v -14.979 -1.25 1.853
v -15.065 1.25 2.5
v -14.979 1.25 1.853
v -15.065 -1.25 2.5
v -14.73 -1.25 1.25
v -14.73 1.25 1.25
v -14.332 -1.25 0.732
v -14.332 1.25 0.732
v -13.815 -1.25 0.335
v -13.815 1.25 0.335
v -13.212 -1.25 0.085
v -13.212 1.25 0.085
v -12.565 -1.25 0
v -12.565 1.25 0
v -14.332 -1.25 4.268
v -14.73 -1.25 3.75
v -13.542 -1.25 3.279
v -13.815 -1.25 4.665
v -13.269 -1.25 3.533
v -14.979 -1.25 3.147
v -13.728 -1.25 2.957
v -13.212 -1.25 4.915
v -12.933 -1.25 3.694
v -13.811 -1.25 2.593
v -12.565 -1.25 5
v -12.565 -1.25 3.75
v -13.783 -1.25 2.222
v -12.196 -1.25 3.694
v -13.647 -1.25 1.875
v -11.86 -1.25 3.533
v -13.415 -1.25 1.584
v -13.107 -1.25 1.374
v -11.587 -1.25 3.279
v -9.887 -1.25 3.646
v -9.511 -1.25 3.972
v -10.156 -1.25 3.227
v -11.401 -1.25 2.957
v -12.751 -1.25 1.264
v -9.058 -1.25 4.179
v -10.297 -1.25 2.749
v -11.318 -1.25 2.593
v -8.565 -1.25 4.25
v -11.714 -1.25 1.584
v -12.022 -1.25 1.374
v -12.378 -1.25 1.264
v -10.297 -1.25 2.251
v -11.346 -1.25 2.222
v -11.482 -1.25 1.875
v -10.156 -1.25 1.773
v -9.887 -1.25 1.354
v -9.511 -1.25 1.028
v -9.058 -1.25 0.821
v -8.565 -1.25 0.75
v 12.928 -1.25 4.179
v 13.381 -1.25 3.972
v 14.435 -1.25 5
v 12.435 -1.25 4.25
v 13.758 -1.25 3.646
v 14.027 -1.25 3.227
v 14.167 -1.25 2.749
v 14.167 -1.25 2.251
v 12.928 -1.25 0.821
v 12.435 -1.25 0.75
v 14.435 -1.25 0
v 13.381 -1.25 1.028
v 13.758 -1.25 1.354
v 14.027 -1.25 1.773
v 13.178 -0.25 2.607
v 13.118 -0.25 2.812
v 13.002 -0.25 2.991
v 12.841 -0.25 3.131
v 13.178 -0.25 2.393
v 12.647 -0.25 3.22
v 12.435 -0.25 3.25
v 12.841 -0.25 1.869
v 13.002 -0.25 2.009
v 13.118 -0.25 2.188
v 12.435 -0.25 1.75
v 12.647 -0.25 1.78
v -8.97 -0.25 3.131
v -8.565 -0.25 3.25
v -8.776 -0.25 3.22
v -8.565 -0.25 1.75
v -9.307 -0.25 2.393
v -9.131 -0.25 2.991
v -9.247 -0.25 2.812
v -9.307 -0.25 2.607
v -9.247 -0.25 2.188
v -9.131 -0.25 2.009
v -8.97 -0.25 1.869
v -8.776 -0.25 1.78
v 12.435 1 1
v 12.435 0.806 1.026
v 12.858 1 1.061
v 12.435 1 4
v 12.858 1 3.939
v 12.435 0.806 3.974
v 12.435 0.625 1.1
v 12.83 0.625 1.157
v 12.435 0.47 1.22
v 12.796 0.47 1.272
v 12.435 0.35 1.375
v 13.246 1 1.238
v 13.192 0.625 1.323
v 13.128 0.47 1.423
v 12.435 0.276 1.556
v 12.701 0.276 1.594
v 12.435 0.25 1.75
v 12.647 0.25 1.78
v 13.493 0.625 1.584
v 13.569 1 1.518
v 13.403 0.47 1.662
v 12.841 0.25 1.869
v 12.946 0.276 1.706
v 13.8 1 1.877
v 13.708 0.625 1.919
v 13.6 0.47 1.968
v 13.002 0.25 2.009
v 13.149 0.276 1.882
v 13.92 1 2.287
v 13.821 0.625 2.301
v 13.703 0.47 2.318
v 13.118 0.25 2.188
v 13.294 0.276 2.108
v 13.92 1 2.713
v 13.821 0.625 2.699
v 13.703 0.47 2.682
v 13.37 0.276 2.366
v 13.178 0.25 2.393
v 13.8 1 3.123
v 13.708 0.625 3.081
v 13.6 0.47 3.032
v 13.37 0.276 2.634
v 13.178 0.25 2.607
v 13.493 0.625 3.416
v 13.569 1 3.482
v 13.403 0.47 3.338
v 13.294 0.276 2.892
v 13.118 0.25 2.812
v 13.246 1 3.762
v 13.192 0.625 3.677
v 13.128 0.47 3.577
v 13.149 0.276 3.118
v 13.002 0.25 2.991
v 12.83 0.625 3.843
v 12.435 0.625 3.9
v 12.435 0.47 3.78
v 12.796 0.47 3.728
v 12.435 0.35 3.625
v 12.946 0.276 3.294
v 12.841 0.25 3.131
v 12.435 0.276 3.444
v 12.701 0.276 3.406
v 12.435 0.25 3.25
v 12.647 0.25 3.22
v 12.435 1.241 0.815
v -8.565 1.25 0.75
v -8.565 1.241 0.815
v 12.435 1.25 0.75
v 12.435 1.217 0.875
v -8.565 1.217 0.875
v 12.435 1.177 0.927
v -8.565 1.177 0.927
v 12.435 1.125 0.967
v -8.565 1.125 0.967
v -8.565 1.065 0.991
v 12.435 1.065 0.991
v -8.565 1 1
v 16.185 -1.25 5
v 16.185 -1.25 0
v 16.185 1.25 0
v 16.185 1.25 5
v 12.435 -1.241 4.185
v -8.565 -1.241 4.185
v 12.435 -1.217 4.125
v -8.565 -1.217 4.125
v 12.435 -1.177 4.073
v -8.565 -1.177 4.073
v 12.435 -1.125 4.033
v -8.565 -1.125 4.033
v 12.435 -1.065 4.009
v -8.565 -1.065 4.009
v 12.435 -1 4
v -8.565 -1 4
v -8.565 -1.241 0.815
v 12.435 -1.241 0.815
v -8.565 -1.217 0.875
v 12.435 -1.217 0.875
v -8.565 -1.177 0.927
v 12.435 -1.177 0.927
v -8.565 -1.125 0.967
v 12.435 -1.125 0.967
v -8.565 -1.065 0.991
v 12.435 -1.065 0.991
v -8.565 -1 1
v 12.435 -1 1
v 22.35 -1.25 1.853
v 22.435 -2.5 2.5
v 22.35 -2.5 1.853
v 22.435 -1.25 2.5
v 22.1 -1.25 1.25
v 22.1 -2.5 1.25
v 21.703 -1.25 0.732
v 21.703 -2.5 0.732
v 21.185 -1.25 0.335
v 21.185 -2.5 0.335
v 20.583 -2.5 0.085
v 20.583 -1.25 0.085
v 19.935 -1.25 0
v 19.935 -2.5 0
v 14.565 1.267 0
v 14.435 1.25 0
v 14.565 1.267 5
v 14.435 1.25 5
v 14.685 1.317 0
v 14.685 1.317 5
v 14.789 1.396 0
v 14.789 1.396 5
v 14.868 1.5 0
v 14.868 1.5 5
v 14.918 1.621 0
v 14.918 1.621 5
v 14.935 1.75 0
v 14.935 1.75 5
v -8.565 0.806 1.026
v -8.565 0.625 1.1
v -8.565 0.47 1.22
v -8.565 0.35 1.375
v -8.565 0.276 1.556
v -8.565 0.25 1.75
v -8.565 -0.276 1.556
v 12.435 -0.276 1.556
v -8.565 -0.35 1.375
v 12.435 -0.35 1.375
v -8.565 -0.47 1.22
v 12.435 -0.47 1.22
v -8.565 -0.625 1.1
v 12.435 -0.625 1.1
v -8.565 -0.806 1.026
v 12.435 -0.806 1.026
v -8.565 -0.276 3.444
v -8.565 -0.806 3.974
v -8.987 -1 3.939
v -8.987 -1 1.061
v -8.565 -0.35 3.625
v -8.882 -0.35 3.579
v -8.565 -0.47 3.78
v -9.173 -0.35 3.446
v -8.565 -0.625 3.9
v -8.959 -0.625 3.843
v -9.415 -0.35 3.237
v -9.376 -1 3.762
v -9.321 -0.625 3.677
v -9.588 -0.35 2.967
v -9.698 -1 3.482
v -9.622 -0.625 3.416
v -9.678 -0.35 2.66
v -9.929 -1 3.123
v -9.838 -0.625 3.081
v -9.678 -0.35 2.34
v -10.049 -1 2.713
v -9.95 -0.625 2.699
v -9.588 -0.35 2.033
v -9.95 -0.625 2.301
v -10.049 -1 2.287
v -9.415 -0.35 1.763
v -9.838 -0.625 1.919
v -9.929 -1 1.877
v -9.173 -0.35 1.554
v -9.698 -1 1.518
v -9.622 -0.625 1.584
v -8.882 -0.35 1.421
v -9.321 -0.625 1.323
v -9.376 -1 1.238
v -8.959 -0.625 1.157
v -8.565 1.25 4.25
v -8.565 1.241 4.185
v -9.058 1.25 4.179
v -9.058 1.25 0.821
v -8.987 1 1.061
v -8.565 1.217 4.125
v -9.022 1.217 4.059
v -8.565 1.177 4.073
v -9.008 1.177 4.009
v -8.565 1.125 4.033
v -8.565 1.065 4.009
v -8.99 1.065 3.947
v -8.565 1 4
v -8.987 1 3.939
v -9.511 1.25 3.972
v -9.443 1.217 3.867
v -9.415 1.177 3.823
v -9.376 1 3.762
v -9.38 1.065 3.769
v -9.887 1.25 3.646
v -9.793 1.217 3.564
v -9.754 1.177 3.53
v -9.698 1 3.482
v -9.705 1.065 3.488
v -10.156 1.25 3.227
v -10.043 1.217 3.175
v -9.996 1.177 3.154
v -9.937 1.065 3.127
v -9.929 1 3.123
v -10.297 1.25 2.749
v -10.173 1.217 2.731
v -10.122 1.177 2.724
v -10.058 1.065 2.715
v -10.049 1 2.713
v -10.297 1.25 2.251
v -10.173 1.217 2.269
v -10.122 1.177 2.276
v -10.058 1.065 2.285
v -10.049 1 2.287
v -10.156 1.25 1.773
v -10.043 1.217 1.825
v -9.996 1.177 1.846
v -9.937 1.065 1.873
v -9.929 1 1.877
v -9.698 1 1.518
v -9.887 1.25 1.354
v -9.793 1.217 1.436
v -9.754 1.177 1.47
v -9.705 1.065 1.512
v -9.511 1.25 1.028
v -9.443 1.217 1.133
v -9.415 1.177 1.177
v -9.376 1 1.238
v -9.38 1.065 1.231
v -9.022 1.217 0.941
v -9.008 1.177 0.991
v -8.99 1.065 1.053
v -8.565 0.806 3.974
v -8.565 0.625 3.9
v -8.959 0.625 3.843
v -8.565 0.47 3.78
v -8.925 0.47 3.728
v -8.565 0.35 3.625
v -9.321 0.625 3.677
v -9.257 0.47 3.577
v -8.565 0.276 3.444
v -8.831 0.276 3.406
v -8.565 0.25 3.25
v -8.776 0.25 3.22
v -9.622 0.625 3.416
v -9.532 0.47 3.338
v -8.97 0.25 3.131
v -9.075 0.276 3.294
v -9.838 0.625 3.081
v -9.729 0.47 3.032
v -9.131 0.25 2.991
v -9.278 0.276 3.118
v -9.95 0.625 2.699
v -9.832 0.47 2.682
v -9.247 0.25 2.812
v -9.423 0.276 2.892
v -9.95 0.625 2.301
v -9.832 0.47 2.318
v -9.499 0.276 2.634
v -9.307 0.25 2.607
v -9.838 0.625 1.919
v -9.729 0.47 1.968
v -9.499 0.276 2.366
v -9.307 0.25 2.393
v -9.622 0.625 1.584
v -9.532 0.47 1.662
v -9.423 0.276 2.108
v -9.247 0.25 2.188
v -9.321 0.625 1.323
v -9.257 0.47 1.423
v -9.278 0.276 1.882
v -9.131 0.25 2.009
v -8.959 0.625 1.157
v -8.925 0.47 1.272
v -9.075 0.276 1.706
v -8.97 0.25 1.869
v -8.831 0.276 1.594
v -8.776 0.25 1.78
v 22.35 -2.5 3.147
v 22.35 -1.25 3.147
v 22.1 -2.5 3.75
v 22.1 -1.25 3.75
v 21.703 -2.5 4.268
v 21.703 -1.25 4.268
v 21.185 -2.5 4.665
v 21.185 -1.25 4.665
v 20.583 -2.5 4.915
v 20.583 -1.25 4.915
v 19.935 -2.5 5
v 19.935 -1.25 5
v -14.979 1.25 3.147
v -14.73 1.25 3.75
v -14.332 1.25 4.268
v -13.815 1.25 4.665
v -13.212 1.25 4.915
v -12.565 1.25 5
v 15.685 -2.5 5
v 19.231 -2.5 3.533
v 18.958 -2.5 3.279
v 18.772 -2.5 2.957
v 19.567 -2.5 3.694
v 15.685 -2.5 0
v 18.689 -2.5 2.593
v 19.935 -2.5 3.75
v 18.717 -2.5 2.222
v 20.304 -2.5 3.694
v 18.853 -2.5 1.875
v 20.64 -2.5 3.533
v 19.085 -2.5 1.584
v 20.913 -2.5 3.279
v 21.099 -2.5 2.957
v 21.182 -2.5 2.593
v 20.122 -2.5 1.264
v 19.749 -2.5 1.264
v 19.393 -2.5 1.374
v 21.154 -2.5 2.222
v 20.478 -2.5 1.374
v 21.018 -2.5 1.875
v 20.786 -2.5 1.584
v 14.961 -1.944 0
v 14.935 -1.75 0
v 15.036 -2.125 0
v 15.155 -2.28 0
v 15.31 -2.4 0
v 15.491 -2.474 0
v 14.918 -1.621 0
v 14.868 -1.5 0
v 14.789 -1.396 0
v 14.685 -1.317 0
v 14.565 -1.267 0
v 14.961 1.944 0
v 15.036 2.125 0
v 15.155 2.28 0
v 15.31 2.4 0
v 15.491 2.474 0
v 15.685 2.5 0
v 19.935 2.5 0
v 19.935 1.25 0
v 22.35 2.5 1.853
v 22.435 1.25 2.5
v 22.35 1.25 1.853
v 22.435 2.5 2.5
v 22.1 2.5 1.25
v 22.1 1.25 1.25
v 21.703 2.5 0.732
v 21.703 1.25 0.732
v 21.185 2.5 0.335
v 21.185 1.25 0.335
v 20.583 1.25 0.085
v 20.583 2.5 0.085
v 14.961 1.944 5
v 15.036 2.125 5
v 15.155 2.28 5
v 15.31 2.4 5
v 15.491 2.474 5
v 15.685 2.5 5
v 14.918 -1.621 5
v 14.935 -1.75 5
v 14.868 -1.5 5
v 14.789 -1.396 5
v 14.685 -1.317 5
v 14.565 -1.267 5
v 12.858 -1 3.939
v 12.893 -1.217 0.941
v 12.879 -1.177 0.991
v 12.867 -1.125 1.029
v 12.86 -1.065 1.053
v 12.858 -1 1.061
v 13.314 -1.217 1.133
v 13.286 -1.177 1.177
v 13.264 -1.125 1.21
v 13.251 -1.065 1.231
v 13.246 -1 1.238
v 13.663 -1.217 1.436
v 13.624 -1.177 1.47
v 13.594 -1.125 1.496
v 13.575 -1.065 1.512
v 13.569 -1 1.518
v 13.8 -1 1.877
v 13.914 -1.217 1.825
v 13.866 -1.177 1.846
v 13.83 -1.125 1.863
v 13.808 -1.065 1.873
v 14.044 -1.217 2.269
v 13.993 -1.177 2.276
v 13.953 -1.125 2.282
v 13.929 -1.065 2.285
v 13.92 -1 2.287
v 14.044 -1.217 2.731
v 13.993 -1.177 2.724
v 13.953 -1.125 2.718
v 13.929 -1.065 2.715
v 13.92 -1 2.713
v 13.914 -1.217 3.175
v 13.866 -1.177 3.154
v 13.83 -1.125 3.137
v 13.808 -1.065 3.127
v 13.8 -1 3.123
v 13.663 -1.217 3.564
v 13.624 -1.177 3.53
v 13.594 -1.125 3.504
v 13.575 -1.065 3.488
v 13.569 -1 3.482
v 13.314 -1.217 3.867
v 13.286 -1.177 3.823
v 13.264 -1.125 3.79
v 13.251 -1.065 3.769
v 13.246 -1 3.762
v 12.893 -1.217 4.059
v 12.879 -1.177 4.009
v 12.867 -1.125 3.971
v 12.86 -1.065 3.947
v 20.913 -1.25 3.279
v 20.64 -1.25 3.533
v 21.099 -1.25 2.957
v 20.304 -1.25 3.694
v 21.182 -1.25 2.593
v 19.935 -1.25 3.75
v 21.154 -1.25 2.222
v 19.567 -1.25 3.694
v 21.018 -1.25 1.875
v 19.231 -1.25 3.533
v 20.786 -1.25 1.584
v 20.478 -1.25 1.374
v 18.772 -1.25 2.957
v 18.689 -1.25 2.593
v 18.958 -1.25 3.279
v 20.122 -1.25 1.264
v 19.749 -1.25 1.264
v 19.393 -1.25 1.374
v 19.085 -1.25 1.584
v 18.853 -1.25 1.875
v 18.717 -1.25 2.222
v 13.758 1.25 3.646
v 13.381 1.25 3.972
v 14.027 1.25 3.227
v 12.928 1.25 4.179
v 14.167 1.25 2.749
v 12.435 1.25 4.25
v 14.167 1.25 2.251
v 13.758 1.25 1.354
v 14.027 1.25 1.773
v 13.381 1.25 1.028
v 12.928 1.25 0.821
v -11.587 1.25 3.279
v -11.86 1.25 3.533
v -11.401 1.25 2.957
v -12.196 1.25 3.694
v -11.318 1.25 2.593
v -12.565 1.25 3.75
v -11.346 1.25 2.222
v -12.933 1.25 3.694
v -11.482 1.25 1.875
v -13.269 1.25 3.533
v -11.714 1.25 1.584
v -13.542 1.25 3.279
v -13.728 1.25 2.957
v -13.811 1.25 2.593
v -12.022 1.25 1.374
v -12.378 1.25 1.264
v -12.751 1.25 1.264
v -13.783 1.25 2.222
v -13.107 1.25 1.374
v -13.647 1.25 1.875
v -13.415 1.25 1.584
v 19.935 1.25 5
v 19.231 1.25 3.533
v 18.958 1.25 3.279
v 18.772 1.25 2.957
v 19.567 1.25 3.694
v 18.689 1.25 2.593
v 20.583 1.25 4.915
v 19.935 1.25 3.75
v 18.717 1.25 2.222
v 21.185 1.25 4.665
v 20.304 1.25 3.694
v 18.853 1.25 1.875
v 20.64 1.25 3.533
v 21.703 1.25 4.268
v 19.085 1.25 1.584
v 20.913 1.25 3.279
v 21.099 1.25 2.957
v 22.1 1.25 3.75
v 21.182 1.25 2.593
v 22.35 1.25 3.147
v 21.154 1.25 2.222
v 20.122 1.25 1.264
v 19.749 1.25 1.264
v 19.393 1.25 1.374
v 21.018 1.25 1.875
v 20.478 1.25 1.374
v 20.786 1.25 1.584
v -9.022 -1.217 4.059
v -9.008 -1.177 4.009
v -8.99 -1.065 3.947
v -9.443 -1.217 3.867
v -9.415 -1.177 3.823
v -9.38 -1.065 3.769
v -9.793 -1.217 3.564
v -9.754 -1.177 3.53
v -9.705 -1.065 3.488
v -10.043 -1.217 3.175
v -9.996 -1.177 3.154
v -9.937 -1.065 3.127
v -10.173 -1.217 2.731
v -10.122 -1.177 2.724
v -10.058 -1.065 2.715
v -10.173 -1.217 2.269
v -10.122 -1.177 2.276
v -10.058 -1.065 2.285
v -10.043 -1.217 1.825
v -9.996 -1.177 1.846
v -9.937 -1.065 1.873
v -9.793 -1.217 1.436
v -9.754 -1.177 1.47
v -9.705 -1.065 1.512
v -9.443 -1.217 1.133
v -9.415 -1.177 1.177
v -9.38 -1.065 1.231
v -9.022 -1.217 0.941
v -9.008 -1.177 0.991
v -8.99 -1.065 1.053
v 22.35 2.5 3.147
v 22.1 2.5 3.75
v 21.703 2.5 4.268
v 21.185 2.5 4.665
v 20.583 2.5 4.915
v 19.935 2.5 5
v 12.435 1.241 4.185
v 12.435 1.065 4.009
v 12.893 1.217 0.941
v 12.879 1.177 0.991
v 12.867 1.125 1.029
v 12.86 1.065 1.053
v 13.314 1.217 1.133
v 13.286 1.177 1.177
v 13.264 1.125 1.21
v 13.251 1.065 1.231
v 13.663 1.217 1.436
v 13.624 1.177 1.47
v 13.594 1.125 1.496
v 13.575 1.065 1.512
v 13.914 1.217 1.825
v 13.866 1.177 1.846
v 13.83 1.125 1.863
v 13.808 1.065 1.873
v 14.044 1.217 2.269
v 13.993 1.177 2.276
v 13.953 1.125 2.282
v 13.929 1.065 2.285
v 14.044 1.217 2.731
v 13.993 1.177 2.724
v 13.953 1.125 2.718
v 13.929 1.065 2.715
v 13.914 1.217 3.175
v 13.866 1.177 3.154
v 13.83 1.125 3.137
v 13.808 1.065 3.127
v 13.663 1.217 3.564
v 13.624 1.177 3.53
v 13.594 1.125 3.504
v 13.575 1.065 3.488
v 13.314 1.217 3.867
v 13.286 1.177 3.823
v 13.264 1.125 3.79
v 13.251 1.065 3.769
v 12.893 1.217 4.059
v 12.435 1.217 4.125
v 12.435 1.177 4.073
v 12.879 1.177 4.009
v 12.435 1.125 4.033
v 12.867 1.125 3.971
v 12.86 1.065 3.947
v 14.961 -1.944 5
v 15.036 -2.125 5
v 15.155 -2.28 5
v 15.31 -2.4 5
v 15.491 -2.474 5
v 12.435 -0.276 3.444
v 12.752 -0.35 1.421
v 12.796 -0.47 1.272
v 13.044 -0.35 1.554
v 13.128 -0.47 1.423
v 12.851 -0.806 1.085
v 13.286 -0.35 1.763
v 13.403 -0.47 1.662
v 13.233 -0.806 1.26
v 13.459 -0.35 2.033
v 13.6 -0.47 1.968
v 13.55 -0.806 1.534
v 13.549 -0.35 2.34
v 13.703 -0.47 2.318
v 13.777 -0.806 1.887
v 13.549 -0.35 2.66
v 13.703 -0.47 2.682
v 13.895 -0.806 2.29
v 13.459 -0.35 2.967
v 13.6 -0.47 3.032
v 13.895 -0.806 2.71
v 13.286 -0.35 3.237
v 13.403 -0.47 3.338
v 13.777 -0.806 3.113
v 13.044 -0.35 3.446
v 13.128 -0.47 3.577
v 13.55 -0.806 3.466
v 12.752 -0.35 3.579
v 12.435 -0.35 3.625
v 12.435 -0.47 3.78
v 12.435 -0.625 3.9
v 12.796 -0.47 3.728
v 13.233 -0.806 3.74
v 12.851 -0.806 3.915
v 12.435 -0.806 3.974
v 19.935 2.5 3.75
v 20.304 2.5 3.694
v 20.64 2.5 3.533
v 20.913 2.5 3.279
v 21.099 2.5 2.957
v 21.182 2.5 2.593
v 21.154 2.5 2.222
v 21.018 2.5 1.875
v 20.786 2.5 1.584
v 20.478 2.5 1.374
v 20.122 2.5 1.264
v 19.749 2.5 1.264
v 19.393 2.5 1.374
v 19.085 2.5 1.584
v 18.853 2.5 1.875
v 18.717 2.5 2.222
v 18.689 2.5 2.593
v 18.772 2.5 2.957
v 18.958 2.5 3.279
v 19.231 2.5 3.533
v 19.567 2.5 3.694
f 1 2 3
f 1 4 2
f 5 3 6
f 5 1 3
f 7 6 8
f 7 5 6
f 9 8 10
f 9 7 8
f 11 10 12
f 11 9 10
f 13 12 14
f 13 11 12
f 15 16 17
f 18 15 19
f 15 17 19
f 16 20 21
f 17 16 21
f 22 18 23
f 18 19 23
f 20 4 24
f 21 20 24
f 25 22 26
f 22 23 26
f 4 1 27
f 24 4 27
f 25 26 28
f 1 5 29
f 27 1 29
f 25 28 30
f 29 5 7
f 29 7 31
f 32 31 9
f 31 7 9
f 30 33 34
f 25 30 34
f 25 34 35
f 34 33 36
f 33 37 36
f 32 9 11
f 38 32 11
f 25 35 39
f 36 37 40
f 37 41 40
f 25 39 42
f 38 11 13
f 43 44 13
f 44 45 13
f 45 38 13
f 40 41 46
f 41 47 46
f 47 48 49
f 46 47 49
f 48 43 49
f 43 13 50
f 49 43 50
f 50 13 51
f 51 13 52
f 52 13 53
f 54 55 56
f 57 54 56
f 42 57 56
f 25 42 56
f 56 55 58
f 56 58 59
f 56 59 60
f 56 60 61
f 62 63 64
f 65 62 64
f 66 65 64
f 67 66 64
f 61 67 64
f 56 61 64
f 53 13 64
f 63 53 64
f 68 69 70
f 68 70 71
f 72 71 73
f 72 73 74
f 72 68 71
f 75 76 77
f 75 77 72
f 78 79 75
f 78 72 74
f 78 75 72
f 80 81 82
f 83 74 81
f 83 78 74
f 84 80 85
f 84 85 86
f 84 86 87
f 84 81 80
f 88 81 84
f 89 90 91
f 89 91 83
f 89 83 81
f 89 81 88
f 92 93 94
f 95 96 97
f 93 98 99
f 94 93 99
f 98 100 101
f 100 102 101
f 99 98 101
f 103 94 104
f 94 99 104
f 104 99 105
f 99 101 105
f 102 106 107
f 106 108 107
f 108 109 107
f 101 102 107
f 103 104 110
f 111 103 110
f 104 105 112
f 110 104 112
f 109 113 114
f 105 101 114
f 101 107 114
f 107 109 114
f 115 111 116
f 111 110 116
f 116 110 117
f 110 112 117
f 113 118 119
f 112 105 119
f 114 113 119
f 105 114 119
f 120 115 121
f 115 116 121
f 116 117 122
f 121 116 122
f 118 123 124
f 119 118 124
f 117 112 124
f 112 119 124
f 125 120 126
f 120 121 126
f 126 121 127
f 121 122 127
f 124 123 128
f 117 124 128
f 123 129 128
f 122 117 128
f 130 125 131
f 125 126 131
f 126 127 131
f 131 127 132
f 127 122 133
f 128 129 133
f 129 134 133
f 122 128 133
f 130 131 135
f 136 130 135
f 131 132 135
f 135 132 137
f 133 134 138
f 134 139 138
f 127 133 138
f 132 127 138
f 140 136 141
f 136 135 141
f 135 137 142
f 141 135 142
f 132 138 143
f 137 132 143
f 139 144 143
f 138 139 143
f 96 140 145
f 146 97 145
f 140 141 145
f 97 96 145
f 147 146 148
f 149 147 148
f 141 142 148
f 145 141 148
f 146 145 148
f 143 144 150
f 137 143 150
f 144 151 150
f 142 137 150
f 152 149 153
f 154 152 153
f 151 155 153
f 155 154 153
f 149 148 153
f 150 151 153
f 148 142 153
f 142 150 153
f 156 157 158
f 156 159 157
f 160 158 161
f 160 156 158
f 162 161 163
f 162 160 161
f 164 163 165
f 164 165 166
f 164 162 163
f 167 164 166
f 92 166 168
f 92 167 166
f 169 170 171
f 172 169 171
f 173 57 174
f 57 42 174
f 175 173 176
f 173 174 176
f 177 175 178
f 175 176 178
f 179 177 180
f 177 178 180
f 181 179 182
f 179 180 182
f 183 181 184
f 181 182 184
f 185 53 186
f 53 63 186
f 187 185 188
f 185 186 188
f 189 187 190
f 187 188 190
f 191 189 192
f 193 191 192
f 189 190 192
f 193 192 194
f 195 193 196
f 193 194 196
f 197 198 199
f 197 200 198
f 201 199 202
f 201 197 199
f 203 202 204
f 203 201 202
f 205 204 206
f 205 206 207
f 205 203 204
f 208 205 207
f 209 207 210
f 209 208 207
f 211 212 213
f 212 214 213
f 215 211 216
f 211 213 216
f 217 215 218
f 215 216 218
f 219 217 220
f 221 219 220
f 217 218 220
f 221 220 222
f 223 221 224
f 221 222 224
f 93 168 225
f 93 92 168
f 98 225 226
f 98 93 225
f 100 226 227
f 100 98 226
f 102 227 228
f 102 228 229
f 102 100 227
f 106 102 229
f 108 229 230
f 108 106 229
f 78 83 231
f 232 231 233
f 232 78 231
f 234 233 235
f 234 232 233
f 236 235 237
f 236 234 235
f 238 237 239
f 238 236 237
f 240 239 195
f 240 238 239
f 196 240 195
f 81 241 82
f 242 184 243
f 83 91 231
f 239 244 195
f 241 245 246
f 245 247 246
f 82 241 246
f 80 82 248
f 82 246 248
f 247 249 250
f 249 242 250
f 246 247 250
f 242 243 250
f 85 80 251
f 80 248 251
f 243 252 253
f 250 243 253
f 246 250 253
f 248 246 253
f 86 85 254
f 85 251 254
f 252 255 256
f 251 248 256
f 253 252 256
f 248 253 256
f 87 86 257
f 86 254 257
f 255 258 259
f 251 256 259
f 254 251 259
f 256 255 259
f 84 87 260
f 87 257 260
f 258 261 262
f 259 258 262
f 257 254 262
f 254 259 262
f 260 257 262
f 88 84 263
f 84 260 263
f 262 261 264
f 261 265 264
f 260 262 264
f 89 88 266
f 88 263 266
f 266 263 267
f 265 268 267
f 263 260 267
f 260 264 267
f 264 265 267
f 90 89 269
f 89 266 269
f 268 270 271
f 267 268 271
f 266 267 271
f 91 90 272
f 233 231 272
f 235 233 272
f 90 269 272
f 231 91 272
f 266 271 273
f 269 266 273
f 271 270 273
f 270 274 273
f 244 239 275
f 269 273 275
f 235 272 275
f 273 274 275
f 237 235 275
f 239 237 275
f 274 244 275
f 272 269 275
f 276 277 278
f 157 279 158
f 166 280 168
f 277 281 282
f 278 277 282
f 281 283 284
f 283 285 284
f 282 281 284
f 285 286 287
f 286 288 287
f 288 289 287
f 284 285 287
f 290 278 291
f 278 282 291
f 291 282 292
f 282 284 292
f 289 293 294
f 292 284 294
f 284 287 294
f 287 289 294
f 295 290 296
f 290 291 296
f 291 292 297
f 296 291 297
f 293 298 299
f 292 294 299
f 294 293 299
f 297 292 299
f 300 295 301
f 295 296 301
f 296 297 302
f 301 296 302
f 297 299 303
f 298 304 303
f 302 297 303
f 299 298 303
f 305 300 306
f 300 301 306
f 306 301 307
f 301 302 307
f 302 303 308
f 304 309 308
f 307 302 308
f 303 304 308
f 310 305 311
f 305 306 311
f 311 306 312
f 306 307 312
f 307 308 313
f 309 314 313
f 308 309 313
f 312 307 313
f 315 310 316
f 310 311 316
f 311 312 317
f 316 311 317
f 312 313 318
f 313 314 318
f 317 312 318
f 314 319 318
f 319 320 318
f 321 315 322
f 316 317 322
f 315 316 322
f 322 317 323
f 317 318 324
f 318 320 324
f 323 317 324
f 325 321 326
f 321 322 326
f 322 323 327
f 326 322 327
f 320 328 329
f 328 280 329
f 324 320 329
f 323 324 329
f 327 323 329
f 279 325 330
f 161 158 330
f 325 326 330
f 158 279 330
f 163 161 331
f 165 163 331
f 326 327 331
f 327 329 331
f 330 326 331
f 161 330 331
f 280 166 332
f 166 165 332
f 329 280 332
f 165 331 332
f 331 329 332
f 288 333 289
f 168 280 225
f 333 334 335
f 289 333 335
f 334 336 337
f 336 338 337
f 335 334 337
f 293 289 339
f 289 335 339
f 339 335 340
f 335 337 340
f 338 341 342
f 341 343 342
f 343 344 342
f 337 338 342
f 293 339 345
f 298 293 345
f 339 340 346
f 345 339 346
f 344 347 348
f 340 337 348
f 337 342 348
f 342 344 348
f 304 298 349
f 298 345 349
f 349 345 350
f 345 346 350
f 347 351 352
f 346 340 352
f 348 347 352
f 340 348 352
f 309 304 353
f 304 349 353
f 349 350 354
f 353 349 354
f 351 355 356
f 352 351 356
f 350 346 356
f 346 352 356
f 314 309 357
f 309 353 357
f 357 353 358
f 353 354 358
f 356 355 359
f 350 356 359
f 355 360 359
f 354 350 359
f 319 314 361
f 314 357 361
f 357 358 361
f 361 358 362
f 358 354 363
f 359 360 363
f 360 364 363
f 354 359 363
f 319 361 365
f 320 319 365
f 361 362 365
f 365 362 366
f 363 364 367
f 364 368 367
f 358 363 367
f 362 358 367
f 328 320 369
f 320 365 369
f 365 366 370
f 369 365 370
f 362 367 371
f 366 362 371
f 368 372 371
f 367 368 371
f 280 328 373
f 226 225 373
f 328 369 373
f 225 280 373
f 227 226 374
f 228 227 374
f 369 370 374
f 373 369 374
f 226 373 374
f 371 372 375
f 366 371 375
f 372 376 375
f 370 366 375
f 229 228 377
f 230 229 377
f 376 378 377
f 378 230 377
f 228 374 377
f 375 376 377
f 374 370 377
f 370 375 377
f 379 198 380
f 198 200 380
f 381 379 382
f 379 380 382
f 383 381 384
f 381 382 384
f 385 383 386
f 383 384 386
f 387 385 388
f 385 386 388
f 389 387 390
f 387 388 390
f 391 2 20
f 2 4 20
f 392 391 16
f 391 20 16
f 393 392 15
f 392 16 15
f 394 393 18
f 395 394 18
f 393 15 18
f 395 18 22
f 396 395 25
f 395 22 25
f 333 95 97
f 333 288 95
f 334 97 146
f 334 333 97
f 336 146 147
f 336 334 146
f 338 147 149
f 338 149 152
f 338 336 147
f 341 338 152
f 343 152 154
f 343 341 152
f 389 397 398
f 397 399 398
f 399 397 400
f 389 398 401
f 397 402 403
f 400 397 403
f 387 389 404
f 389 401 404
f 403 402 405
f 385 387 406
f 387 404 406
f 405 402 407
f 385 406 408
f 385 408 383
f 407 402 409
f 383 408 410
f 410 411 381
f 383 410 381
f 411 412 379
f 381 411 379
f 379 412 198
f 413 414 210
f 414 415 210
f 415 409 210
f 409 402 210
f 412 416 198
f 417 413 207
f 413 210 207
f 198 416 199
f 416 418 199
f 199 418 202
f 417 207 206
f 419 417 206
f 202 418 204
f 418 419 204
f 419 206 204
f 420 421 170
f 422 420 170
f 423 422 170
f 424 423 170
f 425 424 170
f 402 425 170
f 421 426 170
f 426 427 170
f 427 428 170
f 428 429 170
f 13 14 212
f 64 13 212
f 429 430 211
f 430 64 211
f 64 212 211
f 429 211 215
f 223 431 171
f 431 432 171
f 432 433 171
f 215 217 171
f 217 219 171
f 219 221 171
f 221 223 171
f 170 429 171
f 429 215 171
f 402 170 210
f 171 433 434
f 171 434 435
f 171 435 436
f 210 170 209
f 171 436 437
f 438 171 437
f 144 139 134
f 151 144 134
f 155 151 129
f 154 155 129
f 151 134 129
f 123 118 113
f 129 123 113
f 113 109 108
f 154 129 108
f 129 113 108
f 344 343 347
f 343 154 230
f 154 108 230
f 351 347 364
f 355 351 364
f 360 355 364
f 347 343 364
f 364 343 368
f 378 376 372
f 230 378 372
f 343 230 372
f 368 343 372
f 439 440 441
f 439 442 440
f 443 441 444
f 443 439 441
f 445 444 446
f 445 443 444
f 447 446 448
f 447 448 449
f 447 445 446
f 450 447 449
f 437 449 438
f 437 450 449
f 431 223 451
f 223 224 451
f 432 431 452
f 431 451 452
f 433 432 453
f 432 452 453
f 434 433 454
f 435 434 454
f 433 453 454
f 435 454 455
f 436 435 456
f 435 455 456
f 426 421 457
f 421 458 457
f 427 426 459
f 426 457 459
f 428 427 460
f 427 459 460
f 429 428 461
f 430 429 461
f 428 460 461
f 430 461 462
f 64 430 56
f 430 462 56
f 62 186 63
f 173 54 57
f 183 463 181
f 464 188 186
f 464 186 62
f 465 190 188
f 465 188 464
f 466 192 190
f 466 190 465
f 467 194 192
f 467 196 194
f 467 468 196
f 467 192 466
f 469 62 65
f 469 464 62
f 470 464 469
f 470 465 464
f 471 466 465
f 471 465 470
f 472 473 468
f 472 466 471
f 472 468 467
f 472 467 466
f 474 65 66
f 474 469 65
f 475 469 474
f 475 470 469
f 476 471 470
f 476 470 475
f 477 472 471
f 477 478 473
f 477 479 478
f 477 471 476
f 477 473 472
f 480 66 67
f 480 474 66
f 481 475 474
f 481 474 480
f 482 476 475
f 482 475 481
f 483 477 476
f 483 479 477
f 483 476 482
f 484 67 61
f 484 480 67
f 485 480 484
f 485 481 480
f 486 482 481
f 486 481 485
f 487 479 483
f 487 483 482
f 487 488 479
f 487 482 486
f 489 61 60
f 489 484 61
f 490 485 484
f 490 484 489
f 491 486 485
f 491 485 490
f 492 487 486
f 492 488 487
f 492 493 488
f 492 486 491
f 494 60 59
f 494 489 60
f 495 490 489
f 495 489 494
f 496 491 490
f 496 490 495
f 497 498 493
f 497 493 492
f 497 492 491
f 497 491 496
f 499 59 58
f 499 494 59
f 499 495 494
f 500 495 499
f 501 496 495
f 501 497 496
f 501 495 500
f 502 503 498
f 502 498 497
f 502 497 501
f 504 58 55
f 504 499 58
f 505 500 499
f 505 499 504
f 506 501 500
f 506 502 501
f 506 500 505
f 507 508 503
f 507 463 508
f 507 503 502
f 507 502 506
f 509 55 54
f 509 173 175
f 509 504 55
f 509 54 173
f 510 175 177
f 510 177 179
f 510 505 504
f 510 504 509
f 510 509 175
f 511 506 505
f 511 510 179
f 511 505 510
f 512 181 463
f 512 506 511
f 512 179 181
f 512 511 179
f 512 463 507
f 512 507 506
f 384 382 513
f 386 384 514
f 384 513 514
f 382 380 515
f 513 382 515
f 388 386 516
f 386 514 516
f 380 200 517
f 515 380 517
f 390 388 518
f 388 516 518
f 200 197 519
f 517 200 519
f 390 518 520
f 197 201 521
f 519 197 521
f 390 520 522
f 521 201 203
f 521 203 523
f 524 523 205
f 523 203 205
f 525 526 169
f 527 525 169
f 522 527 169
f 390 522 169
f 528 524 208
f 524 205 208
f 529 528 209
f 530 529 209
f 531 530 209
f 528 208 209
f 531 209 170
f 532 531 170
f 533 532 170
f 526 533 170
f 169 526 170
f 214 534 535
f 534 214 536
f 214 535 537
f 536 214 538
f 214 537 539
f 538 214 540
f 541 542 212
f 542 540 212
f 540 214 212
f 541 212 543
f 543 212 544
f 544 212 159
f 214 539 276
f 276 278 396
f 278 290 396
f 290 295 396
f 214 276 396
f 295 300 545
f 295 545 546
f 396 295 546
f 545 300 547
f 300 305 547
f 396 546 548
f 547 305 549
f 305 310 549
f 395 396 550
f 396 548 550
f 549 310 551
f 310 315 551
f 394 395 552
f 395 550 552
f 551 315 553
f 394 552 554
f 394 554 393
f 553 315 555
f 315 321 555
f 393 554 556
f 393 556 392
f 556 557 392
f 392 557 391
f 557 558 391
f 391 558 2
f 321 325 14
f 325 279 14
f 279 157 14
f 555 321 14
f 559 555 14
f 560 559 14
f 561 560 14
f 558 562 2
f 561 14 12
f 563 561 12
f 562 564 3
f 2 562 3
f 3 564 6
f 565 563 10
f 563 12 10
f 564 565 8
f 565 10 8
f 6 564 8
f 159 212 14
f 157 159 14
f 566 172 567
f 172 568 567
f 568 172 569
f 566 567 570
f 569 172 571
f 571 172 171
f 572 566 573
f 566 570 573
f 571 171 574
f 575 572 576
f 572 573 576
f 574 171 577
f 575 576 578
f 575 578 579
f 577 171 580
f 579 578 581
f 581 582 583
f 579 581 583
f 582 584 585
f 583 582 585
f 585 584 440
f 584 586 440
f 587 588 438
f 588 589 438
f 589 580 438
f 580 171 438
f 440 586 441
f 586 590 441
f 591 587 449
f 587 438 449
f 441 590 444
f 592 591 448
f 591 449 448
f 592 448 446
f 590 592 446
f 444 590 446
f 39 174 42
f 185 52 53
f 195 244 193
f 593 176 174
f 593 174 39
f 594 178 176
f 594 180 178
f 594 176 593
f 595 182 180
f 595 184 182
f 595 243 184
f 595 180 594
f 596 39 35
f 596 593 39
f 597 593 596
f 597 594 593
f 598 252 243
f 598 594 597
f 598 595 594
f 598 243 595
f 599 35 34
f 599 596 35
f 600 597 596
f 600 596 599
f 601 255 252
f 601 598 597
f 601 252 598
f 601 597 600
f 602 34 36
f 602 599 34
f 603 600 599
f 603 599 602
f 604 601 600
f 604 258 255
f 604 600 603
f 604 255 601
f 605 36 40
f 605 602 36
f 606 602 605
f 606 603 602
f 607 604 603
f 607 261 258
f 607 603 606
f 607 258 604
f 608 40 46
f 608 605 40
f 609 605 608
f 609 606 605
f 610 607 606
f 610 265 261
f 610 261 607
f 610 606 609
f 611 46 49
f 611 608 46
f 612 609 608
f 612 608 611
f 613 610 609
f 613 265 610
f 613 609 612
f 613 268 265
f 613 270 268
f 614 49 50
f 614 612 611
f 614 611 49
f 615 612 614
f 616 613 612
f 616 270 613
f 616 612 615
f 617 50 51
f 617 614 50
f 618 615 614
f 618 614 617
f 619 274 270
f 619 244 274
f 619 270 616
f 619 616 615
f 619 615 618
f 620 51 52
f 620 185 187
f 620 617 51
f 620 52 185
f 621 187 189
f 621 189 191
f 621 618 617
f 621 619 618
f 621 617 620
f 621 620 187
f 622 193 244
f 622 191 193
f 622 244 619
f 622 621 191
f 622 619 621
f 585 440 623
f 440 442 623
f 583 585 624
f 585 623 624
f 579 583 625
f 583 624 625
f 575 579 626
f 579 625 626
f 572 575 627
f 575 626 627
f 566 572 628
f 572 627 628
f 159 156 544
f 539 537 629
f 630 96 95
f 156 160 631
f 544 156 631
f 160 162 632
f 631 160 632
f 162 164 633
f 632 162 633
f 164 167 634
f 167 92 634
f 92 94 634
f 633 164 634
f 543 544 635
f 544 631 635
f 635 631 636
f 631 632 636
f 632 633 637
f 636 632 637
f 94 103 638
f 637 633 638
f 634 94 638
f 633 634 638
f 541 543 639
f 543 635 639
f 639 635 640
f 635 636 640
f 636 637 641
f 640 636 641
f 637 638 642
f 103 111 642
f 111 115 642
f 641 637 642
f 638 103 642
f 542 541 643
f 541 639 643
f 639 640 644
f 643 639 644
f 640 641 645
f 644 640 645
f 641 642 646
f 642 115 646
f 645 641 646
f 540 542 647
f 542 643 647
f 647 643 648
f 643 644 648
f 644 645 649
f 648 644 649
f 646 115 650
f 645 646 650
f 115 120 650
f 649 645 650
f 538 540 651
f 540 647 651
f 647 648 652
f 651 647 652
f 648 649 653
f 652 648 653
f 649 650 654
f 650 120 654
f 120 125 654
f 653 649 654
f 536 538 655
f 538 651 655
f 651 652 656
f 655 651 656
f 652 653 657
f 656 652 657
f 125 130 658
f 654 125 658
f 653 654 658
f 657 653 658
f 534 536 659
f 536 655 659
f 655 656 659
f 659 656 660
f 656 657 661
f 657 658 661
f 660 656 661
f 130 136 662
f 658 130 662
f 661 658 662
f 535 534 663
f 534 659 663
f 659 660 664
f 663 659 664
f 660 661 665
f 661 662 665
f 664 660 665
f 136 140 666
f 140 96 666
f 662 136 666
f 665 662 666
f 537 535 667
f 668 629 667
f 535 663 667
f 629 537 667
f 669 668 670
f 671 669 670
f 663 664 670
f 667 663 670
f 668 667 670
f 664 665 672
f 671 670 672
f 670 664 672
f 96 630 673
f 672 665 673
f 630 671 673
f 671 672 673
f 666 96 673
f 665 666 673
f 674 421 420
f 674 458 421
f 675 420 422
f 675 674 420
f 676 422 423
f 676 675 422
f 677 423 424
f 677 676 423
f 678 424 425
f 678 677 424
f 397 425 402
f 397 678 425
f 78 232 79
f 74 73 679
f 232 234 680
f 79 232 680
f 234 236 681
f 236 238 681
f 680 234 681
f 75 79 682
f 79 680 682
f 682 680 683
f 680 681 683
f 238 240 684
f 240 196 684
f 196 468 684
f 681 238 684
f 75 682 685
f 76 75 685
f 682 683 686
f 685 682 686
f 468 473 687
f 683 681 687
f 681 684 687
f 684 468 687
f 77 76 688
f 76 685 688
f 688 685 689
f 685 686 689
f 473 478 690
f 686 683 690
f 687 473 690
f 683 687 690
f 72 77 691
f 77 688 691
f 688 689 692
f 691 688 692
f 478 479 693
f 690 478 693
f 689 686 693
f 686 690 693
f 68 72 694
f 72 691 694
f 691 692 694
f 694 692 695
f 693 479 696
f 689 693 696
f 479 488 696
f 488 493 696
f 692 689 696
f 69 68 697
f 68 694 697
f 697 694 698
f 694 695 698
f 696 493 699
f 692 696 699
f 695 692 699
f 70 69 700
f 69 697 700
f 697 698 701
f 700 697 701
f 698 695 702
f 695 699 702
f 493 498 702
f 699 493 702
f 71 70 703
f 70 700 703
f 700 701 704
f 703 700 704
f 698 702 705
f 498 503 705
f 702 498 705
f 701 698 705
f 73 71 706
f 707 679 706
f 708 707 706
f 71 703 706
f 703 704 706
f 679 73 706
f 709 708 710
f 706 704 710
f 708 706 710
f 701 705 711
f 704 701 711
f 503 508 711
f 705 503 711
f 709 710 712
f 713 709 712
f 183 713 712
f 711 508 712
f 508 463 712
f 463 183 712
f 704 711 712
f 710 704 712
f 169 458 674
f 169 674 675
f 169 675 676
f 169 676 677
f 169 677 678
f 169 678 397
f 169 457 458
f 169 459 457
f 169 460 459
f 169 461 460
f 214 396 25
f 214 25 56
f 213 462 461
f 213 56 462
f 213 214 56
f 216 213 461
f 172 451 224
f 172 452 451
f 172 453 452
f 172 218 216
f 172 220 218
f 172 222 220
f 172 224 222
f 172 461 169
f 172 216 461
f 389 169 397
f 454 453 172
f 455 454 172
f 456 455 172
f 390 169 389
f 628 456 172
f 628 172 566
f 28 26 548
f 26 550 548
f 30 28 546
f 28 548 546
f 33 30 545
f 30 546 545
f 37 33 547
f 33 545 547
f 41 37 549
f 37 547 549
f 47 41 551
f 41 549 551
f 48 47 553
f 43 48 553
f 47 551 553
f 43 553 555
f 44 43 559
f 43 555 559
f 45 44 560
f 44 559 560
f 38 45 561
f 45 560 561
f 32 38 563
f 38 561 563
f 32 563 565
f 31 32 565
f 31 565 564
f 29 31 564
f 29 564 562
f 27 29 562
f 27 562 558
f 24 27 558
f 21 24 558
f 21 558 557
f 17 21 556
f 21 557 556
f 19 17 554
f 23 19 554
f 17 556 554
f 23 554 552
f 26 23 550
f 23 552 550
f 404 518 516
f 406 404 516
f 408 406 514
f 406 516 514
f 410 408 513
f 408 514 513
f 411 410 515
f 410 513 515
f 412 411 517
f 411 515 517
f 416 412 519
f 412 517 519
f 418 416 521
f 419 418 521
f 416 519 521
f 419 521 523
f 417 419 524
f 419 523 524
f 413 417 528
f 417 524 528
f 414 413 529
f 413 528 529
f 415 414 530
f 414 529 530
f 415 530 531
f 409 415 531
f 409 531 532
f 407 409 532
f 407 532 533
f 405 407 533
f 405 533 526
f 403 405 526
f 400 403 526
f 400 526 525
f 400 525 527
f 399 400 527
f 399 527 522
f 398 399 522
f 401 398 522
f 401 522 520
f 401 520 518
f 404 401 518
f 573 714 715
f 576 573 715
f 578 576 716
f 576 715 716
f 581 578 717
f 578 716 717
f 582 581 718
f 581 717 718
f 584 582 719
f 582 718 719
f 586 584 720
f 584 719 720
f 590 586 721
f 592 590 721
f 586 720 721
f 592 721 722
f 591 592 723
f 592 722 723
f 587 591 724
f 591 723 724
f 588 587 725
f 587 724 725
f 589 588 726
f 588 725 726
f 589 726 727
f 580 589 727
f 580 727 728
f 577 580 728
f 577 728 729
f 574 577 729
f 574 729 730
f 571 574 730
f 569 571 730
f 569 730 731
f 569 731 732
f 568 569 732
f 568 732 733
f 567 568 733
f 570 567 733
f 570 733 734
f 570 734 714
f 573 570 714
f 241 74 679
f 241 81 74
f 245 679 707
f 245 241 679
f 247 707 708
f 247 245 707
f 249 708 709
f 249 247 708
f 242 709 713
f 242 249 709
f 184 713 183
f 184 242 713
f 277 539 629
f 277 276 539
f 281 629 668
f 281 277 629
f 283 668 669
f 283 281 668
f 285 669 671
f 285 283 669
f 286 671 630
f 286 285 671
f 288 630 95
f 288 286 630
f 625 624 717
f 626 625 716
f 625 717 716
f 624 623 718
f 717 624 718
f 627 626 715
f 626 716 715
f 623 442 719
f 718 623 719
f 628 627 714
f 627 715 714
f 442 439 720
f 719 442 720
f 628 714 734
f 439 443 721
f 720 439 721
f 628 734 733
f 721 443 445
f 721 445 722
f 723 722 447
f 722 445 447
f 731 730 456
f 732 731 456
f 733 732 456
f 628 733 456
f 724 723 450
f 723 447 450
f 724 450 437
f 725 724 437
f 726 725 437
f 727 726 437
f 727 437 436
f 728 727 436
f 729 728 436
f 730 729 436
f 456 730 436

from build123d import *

# Parameters (mm, degrees)
BOSS_EXTRUDE1_DEPTH = 5
FILLET8_R           = 2.5
SKETCH5_R           = 1.25
CUT_EXTRUDE4_DEPTH  = 24.289688565
SKETCH6_R           = 1.25
CUT_EXTRUDE5_DEPTH  = 24.523330833
FILLET9_R           = 0.75
FILLET10_R          = 0.5
SKETCH7_R           = 1.25
CUT_EXTRUDE6_DEPTH  = 1
FILLET11_R          = 0.75
FILLET12_R          = 0.25


with BuildPart() as part:
    # Sketch1 → Boss-Extrude1 (new body)
    with BuildSketch(Plane.XY):
        Polygon((-15.064601776, 1.25), (-15.064601776, -1.25), (14.935398224, -1.25), (14.935398224, -2.5), (22.435398224, -2.5), (22.435398224, -1.25), (16.185398224, -1.25), (16.185398224, 0), (16.185398224, 1.25), (22.435398224, 1.25), (22.435398224, 2.5), (14.935398224, 2.5), (14.935398224, 1.25), align=None)
    extrude(amount=BOSS_EXTRUDE1_DEPTH)

    # Fillet8
    fillet8_edges = [part.edges().sort_by_distance(p)[0] for p in [
        (22.435398224, -1.875, 5),
        (22.435398224, -1.875, 0),
        (22.435398224, 1.875, 0),
        (22.435398224, 1.875, 5),
        (-15.064601776, 0, 0),
        (-15.064601776, 0, 5),
    ]]
    fillet(fillet8_edges, radius=FILLET8_R - 0.0001)  # a hair under: the kernel refuses the full size

    # Sketch5 → Cut-Extrude4 (cut, through all)
    with BuildSketch(Plane(origin=(0, 1.25, 0), x_dir=(1, 0, 0), z_dir=(0, 1, 0))):
        with Locations(Location((-12.564601776, -2.5, 0), (0, 0, 270))):
            Circle(SKETCH5_R)
    extrude(amount=-CUT_EXTRUDE4_DEPTH, mode=Mode.SUBTRACT)

    # Sketch6 → Cut-Extrude5 (cut, through all)
    with BuildSketch(Plane(origin=(0, 2.5, 0), x_dir=(1, 0, 0), z_dir=(0, 1, 0))):
        with Locations(Location((19.935398224, -2.5, 0), (0, 0, 270))):
            Circle(SKETCH6_R)
    extrude(amount=-CUT_EXTRUDE5_DEPTH, mode=Mode.SUBTRACT)

    # Fillet9
    fillet9_edges = [part.edges().sort_by_distance(p)[0] for p in [
        (14.935398224, 2.5, 2.5),
        (14.935398224, -2.5, 2.5),
    ]]
    fillet(fillet9_edges, radius=FILLET9_R)

    # Fillet10
    fillet10_edges = [part.edges().sort_by_distance(p)[0] for p in [
        (14.935398224, -1.25, 2.5),
        (14.935398224, 1.25, 2.5),
    ]]
    fillet(fillet10_edges, radius=FILLET10_R - 0.0001)  # a hair under: the kernel refuses the full size

    # Sketch7 → Cut-Extrude6 (cut)
    with BuildSketch(Plane(origin=(0, 1.25, 0), x_dir=(1, 0, 0), z_dir=(0, 1, 0))):
        with Locations(Location((-12.564601776, -2.5, 0), (0, 0, 270))):
            Circle(SKETCH7_R)
        with BuildLine():
            Line((-8.564601776, -1), (12.435398224, -1))
            ThreePointArc((12.435398224, -1), (13.935398224, -2.5), (12.435398224, -4))
            Line((12.435398224, -4), (-8.564601776, -4))
            ThreePointArc((-8.564601776, -4), (-10.064601776, -2.5), (-8.564601776, -1))
        make_face()
    cut_extrude6 = extrude(amount=-CUT_EXTRUDE6_DEPTH, mode=Mode.SUBTRACT)

    # Mirror2: Cut-Extrude6 across plane
    add(cut_extrude6.mirror(Plane.ZX), mode=Mode.SUBTRACT)

    # Fillet11
    fillet11_edges = [part.edges().sort_by_distance(p)[0] for p in [
        (-10.064601776, 0.25, 2.5),
        (1.935398224, 0.25, 1),
        (13.935398224, 0.25, 2.5),
        (1.935398224, 0.25, 4),
        (-10.064601776, -0.25, 2.5),
        (1.935398224, -0.25, 4),
        (13.935398224, -0.25, 2.5),
        (1.935398224, -0.25, 1),
    ]]
    fillet(fillet11_edges, radius=FILLET11_R)

    # Fillet12
    fillet12_edges = [part.edges().sort_by_distance(p)[0] for p in [
        (1.935398224, -1.25, 1),
        (13.935398224, -1.25, 2.5),
        (1.935398224, -1.25, 4),
        (1.935398224, 1.25, 1),
        (13.935398224, 1.25, 2.5),
        (1.935398224, 1.25, 4),
        (-10.064601776, -1.25, 2.5),
        (-10.064601776, 1.25, 2.5),
    ]]
    fillet(fillet12_edges, radius=FILLET12_R - 0.0001)  # a hair under: the kernel refuses the full size


solid = part.part
